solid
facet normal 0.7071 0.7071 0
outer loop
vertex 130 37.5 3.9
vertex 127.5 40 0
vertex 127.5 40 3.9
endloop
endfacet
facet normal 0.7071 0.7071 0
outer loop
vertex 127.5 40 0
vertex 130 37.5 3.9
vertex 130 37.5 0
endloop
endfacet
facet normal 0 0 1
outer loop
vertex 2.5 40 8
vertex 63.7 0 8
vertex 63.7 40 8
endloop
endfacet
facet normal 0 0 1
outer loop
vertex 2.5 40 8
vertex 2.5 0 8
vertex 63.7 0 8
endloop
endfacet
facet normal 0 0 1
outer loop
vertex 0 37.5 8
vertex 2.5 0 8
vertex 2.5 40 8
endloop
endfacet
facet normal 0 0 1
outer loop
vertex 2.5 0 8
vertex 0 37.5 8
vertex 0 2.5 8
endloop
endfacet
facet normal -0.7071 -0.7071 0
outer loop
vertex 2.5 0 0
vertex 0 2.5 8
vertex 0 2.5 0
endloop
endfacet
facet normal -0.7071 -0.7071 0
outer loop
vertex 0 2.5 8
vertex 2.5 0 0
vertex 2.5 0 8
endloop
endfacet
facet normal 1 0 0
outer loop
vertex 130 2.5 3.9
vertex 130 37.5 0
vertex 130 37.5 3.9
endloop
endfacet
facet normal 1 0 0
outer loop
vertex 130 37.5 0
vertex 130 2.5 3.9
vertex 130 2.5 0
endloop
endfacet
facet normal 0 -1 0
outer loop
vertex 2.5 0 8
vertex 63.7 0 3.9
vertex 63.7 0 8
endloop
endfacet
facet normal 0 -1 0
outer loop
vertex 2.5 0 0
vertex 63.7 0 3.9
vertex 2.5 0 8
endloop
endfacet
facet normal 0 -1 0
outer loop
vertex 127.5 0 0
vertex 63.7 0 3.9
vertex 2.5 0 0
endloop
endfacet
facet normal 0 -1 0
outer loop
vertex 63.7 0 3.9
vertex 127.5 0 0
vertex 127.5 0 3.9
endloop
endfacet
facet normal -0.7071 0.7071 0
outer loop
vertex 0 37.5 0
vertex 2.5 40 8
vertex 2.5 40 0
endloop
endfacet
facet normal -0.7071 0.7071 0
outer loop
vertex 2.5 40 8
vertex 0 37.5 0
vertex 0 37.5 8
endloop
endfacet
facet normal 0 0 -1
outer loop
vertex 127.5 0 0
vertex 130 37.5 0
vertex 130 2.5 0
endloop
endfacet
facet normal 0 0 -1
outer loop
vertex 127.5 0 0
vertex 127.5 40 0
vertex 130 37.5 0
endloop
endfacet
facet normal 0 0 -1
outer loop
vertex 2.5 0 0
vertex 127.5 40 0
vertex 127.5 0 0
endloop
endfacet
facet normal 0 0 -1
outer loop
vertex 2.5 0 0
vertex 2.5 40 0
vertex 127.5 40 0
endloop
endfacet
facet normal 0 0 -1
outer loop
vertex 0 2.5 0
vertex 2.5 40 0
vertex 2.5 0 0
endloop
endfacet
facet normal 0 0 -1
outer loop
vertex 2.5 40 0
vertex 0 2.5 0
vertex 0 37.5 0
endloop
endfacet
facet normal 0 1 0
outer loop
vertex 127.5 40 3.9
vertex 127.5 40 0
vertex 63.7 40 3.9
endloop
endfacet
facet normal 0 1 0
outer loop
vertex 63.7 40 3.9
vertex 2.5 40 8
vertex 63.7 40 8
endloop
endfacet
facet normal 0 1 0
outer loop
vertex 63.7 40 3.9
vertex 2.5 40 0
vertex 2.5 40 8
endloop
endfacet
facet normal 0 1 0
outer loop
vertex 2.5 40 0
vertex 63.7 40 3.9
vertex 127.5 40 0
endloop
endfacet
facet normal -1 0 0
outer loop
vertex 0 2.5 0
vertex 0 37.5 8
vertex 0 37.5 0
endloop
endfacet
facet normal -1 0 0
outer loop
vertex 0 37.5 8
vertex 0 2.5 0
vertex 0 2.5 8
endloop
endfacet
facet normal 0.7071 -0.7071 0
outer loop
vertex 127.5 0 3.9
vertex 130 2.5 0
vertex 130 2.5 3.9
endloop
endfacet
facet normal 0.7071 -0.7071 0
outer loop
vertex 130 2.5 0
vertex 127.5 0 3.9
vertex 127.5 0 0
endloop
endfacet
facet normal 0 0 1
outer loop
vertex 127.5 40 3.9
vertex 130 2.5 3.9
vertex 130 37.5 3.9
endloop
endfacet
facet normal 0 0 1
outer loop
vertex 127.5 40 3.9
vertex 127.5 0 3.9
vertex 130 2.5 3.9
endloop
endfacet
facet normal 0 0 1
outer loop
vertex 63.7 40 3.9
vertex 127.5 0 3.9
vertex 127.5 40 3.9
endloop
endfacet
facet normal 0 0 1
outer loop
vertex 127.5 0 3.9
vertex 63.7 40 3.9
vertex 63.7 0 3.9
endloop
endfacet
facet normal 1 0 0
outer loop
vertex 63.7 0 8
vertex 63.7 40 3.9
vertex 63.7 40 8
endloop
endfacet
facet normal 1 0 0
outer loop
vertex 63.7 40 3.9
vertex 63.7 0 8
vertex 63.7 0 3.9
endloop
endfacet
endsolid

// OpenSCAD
$fn = 32;

// ----------------------------------------------------------------------
// Stepped bar: endstep, 130 x 40 x 8/3.9 mm
// ----------------------------------------------------------------------

// --- parameters (mm) ---
bar_l = 130;              // bar length, X
bar_w = 40;               // bar width, Y
plate_t = 8;              // thickness of the thick zone, Z
thin_t = 3.9;             // thickness of the thin zone
corner_c = 2.5;           // corner chamfer of the bar
step_cut = 4.1;           // material removed from the thin zone
step_x = 63.7;            // step position from the left end
depth_1 = 4.1;            // depth of cut 1 from the top face
fit_tol = 0.02;           // declared fit tolerance (prompt contract)
free_tol = 0.2;           // declared free tolerance (prompt contract)

profile = [[2.5, 0], [127.5, 0], [130, 2.5], [130, 37.5], [127.5, 40], [2.5, 40], [0, 37.5], [0, 2.5]];  // primary outline, 8 points, counter clockwise
void_1 = [[63.7, -1], [131, -1], [131, 41], [63.7, 41]];  // thin zone beyond the step, 4 points

// --- the one profile operation ---
difference() {
  linear_extrude(height = plate_t) polygon(points = profile);
  translate([0, 0, plate_t - depth_1])
    linear_extrude(height = depth_1 + 1) polygon(points = void_1);
}
